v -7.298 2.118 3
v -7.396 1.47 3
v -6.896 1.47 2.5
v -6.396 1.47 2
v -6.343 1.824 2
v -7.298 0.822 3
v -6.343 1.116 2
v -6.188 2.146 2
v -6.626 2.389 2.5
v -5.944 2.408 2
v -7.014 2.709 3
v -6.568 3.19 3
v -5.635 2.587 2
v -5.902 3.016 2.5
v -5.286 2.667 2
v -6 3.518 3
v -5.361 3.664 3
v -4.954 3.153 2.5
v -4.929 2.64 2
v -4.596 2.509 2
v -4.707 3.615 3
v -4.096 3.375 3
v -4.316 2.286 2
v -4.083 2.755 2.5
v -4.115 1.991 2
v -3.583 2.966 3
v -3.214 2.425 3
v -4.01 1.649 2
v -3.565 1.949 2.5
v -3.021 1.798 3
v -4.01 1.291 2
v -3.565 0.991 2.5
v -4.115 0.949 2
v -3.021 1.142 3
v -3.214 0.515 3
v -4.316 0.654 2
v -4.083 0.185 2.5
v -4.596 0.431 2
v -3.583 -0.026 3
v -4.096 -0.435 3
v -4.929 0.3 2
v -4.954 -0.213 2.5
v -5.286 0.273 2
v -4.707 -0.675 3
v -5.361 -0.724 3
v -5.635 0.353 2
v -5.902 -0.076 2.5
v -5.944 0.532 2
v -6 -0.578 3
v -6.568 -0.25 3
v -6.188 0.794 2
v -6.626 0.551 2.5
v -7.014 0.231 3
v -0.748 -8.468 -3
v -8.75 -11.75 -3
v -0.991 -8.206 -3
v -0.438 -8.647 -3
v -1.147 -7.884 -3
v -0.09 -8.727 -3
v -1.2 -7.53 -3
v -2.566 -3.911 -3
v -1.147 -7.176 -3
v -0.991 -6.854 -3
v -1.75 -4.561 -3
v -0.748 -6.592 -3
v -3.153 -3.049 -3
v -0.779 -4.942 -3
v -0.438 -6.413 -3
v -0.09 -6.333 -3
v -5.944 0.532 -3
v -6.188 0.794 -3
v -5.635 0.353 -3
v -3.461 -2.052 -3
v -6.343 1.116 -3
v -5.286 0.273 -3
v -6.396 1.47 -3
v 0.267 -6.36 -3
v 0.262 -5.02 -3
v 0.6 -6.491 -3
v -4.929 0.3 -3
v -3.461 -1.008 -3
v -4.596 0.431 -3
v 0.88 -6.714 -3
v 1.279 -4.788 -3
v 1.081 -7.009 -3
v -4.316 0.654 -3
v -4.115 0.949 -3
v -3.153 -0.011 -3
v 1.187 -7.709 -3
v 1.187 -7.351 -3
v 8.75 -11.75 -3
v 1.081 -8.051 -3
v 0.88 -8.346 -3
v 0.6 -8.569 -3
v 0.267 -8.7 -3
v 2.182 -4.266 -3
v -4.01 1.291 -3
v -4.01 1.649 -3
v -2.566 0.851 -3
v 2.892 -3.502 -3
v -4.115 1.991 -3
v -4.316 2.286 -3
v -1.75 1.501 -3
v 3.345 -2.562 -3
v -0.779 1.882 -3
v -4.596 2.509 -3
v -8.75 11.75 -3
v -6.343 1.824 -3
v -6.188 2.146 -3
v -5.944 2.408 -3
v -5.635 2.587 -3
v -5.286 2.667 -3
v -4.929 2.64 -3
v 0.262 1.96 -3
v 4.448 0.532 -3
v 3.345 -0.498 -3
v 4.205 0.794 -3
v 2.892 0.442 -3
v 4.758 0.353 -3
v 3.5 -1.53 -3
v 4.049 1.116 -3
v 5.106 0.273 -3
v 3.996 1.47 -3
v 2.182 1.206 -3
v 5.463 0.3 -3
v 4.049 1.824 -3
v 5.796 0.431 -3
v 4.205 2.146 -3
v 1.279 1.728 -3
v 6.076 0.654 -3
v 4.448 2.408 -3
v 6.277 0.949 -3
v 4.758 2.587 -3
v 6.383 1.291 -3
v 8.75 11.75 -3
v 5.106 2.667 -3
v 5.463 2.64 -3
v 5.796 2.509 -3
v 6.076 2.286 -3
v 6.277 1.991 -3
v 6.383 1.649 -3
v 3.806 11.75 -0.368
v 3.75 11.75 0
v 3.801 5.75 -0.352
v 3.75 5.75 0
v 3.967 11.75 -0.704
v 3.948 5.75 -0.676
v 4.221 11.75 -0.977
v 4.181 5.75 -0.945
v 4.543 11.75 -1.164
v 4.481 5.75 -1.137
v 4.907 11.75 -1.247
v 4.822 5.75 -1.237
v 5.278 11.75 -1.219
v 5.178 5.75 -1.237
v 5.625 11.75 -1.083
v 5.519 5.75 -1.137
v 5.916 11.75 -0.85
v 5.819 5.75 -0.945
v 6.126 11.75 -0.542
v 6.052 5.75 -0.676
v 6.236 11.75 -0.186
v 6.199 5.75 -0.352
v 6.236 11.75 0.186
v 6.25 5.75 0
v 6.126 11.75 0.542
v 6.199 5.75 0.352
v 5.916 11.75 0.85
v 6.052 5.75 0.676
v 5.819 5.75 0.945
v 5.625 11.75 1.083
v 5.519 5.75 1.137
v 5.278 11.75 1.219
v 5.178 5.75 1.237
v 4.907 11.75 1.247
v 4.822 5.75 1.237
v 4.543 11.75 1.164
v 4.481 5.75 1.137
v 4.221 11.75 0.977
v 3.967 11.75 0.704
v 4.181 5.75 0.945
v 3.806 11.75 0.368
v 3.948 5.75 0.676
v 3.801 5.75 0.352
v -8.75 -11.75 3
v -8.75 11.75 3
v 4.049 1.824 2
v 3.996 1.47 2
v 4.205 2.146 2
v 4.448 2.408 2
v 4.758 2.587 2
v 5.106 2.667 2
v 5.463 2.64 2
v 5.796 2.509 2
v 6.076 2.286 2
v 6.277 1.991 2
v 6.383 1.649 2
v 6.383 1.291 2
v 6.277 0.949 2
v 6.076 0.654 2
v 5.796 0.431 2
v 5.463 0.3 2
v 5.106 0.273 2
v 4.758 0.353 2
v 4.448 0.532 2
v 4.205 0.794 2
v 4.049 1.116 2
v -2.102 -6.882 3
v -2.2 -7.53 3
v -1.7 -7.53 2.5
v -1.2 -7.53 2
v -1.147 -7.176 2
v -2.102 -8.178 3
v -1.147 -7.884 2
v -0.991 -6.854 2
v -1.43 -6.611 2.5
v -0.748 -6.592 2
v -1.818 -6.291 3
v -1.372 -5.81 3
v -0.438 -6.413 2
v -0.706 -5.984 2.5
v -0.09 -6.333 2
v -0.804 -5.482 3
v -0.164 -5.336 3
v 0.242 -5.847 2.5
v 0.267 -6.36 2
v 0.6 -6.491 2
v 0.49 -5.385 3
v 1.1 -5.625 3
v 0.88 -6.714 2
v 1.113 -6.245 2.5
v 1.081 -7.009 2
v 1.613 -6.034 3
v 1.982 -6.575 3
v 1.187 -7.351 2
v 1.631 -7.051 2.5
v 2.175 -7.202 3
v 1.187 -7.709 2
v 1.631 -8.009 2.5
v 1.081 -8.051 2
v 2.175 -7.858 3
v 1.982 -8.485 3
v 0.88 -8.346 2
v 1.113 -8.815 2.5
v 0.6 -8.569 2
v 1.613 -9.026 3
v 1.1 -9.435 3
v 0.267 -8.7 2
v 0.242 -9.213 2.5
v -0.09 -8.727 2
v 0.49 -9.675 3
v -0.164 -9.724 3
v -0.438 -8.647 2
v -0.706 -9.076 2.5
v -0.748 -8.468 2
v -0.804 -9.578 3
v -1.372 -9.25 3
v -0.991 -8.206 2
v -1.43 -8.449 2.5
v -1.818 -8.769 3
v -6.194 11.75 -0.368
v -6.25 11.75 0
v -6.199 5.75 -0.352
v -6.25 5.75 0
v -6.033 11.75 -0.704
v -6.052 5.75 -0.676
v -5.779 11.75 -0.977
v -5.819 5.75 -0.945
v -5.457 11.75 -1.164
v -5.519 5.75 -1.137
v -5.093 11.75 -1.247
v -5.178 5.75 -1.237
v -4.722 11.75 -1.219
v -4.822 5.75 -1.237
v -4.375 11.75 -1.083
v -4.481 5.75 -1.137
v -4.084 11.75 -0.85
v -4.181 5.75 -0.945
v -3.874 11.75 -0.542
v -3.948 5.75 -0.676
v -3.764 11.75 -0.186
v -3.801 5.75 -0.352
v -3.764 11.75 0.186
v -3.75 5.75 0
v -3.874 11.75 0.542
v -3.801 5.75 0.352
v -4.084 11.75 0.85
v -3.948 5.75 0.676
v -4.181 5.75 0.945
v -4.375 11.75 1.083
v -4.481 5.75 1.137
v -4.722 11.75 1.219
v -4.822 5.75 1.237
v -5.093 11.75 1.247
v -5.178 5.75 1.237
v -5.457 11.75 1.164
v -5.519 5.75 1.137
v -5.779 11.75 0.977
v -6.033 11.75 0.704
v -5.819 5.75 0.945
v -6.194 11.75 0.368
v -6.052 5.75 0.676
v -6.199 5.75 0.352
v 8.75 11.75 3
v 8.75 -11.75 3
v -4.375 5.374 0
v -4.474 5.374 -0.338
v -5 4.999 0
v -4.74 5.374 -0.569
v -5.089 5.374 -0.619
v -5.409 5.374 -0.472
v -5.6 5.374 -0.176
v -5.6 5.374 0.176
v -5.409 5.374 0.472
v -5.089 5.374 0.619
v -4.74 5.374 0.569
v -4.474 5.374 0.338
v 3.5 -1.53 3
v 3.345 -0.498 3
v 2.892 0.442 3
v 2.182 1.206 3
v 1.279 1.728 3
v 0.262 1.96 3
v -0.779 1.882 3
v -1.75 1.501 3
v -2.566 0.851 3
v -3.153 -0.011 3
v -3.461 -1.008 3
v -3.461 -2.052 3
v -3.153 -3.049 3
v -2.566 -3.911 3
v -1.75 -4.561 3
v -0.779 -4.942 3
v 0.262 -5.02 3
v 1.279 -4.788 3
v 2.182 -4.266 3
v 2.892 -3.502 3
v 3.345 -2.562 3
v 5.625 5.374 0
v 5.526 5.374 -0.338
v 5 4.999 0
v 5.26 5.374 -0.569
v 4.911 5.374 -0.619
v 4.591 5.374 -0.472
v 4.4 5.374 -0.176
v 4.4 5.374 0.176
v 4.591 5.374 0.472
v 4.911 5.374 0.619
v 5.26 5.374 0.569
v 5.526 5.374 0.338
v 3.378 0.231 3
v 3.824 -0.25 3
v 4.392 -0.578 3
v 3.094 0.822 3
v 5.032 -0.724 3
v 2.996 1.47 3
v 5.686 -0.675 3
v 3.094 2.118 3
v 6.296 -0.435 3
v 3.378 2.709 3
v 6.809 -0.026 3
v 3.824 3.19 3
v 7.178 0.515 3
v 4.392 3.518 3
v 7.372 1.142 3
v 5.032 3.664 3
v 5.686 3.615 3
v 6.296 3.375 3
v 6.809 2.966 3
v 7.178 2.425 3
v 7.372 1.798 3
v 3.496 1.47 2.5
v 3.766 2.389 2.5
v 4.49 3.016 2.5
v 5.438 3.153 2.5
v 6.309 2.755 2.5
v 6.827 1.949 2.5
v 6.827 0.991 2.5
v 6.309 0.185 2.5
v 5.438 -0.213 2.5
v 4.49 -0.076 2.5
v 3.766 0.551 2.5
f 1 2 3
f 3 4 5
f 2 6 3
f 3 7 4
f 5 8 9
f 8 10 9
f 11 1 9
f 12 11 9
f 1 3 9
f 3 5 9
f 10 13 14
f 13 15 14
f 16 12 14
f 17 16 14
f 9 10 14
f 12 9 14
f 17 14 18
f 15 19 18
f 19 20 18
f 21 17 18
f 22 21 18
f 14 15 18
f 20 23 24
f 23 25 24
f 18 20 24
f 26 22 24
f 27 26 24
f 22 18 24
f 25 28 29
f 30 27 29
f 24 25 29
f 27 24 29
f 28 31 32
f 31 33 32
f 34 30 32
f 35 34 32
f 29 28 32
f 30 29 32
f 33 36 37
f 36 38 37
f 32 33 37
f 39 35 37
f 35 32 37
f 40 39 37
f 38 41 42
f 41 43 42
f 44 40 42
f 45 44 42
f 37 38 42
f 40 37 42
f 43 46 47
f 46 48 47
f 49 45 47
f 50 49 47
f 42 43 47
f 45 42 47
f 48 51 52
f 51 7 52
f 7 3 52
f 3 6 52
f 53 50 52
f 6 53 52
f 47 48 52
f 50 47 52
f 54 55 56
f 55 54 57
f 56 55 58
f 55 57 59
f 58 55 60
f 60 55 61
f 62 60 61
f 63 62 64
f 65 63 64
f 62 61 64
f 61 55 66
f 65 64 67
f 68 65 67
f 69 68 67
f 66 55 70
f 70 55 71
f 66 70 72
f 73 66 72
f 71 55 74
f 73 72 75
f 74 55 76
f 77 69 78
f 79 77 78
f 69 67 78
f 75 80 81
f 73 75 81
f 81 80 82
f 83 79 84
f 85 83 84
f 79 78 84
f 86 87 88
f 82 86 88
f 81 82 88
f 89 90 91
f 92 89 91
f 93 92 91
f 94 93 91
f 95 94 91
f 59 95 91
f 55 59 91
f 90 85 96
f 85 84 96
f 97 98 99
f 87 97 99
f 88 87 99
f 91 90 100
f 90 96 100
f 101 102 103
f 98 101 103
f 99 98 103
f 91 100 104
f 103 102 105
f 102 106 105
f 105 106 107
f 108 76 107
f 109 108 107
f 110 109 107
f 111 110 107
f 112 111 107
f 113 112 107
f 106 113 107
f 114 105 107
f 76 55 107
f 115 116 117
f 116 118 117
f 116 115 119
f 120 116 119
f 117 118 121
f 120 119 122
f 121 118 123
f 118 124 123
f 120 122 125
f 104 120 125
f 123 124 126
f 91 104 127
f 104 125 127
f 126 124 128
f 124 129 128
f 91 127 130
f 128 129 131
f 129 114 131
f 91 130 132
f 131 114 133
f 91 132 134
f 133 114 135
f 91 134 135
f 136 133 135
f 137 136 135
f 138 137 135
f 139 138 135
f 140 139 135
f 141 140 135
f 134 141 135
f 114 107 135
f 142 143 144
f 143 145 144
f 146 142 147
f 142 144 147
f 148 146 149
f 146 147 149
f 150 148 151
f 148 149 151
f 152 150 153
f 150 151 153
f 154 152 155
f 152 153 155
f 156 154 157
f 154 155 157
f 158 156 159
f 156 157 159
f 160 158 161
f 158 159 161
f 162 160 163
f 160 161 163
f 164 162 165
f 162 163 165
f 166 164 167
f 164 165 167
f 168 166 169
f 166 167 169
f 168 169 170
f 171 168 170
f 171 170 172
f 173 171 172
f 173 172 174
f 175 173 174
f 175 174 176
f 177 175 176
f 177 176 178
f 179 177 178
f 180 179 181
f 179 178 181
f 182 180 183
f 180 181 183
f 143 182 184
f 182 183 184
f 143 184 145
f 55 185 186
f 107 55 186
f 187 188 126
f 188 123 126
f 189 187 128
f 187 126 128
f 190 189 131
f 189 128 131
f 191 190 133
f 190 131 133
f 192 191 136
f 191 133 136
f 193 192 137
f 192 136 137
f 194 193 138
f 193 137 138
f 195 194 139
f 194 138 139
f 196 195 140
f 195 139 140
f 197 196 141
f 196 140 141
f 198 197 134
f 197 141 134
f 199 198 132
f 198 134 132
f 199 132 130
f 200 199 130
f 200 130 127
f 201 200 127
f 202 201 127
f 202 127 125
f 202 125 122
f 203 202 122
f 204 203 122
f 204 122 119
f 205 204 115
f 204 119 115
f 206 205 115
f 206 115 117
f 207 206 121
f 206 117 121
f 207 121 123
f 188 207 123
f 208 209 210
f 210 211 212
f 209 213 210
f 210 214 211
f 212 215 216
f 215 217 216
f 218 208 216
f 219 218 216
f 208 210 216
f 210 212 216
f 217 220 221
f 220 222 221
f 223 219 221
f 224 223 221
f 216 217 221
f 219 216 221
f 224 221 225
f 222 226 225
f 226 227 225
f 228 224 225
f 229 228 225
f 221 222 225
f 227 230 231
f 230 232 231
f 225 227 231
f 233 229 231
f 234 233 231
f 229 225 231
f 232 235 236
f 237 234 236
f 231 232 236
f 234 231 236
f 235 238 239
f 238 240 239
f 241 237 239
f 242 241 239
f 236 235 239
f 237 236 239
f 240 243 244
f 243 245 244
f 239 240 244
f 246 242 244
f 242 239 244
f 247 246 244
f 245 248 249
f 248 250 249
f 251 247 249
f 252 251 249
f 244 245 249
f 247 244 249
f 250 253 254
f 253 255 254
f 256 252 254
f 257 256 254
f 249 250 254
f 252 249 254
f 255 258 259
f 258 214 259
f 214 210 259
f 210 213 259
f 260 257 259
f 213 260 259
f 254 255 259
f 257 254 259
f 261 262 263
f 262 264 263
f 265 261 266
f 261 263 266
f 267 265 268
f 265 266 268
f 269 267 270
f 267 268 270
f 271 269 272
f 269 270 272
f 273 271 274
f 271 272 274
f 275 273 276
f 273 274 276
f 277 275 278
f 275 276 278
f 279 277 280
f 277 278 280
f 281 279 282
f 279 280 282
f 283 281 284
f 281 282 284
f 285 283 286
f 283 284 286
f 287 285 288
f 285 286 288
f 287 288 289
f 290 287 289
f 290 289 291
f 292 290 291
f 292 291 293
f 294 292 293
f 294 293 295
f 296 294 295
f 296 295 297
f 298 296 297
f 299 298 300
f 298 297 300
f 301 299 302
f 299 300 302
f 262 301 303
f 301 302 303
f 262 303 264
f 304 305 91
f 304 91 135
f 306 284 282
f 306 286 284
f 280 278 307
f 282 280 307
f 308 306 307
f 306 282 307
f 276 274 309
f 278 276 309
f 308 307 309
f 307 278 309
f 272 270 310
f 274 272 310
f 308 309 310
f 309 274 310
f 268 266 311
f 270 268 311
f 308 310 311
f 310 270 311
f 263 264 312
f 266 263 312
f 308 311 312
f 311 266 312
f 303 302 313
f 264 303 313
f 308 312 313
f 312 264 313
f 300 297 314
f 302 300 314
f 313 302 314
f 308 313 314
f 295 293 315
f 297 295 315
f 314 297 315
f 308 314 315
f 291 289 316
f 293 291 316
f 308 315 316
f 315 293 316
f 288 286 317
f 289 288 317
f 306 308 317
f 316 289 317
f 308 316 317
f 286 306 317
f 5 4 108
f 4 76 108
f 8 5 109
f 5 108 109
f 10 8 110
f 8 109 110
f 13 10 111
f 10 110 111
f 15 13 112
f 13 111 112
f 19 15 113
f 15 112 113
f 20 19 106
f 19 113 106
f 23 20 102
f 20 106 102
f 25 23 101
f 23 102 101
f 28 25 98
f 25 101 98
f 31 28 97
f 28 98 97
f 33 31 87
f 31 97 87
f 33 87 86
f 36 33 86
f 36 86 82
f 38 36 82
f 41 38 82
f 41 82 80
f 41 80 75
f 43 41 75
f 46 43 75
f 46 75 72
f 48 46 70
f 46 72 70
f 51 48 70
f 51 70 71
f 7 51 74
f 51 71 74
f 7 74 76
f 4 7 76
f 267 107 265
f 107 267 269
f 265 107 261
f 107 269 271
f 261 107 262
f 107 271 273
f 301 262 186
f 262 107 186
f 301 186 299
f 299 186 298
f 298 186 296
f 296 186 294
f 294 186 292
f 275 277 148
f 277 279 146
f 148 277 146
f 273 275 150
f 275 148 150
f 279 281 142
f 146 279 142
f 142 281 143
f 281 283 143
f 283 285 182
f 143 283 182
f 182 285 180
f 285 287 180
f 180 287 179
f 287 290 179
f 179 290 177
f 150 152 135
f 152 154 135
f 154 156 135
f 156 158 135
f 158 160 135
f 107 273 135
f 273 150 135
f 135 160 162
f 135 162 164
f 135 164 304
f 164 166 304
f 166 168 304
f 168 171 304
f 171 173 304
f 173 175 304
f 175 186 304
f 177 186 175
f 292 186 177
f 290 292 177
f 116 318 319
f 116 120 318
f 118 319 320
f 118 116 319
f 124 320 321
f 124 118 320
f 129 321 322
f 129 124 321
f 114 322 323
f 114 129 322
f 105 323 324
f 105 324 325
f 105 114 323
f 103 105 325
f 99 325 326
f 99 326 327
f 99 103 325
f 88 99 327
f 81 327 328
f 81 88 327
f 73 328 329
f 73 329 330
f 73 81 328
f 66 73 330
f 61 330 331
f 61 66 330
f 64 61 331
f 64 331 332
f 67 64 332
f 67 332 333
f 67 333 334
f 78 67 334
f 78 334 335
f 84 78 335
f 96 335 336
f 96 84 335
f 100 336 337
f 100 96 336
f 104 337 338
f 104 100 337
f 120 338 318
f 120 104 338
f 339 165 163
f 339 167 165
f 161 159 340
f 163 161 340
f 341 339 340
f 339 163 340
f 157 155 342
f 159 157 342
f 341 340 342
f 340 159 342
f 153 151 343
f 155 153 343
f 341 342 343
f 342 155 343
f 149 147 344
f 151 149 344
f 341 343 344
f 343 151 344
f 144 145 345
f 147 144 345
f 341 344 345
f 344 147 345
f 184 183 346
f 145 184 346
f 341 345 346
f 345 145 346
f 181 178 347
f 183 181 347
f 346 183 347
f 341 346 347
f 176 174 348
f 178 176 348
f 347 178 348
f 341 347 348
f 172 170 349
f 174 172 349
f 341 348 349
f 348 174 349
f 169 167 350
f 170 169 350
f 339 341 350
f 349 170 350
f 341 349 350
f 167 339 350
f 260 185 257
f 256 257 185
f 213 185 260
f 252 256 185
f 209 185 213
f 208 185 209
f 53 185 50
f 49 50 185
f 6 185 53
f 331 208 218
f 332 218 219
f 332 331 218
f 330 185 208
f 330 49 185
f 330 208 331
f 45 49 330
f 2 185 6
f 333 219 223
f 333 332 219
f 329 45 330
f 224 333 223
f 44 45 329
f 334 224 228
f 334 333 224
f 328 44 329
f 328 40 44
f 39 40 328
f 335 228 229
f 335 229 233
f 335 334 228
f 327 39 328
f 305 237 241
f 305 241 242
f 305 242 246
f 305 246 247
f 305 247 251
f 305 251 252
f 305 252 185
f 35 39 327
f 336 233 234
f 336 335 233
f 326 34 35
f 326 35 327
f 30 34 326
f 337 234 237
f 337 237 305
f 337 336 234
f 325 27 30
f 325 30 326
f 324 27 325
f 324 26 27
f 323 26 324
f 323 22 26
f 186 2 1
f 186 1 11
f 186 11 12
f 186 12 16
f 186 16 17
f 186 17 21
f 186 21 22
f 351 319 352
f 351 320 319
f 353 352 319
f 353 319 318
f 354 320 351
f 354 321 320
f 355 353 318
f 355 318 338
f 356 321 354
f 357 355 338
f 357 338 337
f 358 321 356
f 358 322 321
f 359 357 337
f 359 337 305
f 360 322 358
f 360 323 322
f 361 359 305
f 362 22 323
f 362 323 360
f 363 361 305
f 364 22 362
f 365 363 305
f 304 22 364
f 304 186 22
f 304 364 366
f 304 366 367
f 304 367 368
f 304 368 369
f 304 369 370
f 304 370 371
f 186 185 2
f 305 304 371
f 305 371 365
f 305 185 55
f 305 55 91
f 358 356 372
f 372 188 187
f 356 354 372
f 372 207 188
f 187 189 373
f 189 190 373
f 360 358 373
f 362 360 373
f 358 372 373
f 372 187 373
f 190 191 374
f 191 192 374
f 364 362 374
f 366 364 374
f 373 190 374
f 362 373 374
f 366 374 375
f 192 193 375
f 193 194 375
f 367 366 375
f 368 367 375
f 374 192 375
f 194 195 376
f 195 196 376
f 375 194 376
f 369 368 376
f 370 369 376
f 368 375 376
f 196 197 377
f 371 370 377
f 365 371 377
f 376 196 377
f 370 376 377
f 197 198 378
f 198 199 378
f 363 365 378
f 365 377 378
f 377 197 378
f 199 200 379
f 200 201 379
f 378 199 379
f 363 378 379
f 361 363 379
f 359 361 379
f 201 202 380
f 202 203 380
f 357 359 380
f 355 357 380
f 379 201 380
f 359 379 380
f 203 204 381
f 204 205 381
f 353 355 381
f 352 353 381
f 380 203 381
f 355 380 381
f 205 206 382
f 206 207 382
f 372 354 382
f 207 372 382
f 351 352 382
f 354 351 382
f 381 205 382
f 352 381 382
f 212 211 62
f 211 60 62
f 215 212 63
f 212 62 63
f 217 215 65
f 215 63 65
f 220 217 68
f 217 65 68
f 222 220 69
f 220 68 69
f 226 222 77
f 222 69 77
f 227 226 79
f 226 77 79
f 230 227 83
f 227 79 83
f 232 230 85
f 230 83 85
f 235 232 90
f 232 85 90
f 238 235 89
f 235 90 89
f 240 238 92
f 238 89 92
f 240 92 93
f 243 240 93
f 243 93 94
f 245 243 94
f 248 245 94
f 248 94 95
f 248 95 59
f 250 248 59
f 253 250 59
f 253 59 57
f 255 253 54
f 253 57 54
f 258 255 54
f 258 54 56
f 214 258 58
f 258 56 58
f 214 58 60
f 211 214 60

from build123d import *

# Parameters (mm, degrees)
SKETCH1_W                                           = 17.5
SKETCH1_H                                           = 23.5
SKETCH1_R                                           = 3.5
BOSS_EXTRUDE1_DEPTH                                 = 3
CSK_FOR_M2_COUNTERSUNK_FLAT_HEAD_SCREW1_D           = 2.4
CSK_FOR_M2_COUNTERSUNK_FLAT_HEAD_SCREW1_CSINK_D     = 4.4
CSK_FOR_M2_COUNTERSUNK_FLAT_HEAD_SCREW1_CSINK_ANGLE = 90
TAP_DRILL_FOR_M3_TAP1_D                             = 2.5
TAP_DRILL_FOR_M3_TAP1_DEPTH                         = 6
TAP_DRILL_FOR_M3_TAP1_TIP                           = 0.751075774


with BuildPart() as part:
    # Sketch1 → Boss-Extrude1 (new, symmetric)
    with BuildSketch(Plane.XY):
        Rectangle(SKETCH1_W, SKETCH1_H)
        with Locations((0, -1.53)):
            Circle(SKETCH1_R, mode=Mode.SUBTRACT)
    extrude(amount=BOSS_EXTRUDE1_DEPTH, both=True)

    # CSK for M2 Countersunk Flat Head Screw1 (through all)
    with Locations(Plane.XY.offset(3)):
        with Locations((0, -7.53), (-5.196152423, 1.47), (5.196152423, 1.47)):
            CounterSinkHole(CSK_FOR_M2_COUNTERSUNK_FLAT_HEAD_SCREW1_D / 2, CSK_FOR_M2_COUNTERSUNK_FLAT_HEAD_SCREW1_CSINK_D / 2, counter_sink_angle=CSK_FOR_M2_COUNTERSUNK_FLAT_HEAD_SCREW1_CSINK_ANGLE)

    # Tap Drill for M3 Tap1
    with Locations(Plane(origin=(0, 11.75, 0), x_dir=(1, 0, 0), z_dir=(0, 1, 0))):
        with Locations((-5, 0), (5, 0)):
            Hole(TAP_DRILL_FOR_M3_TAP1_D / 2, depth=TAP_DRILL_FOR_M3_TAP1_DEPTH)
            with Locations((0, 0, -(TAP_DRILL_FOR_M3_TAP1_DEPTH + TAP_DRILL_FOR_M3_TAP1_TIP / 2))):  # 118° drill point
                Cone(0, TAP_DRILL_FOR_M3_TAP1_D / 2, TAP_DRILL_FOR_M3_TAP1_TIP, mode=Mode.SUBTRACT)


solid = part.part
